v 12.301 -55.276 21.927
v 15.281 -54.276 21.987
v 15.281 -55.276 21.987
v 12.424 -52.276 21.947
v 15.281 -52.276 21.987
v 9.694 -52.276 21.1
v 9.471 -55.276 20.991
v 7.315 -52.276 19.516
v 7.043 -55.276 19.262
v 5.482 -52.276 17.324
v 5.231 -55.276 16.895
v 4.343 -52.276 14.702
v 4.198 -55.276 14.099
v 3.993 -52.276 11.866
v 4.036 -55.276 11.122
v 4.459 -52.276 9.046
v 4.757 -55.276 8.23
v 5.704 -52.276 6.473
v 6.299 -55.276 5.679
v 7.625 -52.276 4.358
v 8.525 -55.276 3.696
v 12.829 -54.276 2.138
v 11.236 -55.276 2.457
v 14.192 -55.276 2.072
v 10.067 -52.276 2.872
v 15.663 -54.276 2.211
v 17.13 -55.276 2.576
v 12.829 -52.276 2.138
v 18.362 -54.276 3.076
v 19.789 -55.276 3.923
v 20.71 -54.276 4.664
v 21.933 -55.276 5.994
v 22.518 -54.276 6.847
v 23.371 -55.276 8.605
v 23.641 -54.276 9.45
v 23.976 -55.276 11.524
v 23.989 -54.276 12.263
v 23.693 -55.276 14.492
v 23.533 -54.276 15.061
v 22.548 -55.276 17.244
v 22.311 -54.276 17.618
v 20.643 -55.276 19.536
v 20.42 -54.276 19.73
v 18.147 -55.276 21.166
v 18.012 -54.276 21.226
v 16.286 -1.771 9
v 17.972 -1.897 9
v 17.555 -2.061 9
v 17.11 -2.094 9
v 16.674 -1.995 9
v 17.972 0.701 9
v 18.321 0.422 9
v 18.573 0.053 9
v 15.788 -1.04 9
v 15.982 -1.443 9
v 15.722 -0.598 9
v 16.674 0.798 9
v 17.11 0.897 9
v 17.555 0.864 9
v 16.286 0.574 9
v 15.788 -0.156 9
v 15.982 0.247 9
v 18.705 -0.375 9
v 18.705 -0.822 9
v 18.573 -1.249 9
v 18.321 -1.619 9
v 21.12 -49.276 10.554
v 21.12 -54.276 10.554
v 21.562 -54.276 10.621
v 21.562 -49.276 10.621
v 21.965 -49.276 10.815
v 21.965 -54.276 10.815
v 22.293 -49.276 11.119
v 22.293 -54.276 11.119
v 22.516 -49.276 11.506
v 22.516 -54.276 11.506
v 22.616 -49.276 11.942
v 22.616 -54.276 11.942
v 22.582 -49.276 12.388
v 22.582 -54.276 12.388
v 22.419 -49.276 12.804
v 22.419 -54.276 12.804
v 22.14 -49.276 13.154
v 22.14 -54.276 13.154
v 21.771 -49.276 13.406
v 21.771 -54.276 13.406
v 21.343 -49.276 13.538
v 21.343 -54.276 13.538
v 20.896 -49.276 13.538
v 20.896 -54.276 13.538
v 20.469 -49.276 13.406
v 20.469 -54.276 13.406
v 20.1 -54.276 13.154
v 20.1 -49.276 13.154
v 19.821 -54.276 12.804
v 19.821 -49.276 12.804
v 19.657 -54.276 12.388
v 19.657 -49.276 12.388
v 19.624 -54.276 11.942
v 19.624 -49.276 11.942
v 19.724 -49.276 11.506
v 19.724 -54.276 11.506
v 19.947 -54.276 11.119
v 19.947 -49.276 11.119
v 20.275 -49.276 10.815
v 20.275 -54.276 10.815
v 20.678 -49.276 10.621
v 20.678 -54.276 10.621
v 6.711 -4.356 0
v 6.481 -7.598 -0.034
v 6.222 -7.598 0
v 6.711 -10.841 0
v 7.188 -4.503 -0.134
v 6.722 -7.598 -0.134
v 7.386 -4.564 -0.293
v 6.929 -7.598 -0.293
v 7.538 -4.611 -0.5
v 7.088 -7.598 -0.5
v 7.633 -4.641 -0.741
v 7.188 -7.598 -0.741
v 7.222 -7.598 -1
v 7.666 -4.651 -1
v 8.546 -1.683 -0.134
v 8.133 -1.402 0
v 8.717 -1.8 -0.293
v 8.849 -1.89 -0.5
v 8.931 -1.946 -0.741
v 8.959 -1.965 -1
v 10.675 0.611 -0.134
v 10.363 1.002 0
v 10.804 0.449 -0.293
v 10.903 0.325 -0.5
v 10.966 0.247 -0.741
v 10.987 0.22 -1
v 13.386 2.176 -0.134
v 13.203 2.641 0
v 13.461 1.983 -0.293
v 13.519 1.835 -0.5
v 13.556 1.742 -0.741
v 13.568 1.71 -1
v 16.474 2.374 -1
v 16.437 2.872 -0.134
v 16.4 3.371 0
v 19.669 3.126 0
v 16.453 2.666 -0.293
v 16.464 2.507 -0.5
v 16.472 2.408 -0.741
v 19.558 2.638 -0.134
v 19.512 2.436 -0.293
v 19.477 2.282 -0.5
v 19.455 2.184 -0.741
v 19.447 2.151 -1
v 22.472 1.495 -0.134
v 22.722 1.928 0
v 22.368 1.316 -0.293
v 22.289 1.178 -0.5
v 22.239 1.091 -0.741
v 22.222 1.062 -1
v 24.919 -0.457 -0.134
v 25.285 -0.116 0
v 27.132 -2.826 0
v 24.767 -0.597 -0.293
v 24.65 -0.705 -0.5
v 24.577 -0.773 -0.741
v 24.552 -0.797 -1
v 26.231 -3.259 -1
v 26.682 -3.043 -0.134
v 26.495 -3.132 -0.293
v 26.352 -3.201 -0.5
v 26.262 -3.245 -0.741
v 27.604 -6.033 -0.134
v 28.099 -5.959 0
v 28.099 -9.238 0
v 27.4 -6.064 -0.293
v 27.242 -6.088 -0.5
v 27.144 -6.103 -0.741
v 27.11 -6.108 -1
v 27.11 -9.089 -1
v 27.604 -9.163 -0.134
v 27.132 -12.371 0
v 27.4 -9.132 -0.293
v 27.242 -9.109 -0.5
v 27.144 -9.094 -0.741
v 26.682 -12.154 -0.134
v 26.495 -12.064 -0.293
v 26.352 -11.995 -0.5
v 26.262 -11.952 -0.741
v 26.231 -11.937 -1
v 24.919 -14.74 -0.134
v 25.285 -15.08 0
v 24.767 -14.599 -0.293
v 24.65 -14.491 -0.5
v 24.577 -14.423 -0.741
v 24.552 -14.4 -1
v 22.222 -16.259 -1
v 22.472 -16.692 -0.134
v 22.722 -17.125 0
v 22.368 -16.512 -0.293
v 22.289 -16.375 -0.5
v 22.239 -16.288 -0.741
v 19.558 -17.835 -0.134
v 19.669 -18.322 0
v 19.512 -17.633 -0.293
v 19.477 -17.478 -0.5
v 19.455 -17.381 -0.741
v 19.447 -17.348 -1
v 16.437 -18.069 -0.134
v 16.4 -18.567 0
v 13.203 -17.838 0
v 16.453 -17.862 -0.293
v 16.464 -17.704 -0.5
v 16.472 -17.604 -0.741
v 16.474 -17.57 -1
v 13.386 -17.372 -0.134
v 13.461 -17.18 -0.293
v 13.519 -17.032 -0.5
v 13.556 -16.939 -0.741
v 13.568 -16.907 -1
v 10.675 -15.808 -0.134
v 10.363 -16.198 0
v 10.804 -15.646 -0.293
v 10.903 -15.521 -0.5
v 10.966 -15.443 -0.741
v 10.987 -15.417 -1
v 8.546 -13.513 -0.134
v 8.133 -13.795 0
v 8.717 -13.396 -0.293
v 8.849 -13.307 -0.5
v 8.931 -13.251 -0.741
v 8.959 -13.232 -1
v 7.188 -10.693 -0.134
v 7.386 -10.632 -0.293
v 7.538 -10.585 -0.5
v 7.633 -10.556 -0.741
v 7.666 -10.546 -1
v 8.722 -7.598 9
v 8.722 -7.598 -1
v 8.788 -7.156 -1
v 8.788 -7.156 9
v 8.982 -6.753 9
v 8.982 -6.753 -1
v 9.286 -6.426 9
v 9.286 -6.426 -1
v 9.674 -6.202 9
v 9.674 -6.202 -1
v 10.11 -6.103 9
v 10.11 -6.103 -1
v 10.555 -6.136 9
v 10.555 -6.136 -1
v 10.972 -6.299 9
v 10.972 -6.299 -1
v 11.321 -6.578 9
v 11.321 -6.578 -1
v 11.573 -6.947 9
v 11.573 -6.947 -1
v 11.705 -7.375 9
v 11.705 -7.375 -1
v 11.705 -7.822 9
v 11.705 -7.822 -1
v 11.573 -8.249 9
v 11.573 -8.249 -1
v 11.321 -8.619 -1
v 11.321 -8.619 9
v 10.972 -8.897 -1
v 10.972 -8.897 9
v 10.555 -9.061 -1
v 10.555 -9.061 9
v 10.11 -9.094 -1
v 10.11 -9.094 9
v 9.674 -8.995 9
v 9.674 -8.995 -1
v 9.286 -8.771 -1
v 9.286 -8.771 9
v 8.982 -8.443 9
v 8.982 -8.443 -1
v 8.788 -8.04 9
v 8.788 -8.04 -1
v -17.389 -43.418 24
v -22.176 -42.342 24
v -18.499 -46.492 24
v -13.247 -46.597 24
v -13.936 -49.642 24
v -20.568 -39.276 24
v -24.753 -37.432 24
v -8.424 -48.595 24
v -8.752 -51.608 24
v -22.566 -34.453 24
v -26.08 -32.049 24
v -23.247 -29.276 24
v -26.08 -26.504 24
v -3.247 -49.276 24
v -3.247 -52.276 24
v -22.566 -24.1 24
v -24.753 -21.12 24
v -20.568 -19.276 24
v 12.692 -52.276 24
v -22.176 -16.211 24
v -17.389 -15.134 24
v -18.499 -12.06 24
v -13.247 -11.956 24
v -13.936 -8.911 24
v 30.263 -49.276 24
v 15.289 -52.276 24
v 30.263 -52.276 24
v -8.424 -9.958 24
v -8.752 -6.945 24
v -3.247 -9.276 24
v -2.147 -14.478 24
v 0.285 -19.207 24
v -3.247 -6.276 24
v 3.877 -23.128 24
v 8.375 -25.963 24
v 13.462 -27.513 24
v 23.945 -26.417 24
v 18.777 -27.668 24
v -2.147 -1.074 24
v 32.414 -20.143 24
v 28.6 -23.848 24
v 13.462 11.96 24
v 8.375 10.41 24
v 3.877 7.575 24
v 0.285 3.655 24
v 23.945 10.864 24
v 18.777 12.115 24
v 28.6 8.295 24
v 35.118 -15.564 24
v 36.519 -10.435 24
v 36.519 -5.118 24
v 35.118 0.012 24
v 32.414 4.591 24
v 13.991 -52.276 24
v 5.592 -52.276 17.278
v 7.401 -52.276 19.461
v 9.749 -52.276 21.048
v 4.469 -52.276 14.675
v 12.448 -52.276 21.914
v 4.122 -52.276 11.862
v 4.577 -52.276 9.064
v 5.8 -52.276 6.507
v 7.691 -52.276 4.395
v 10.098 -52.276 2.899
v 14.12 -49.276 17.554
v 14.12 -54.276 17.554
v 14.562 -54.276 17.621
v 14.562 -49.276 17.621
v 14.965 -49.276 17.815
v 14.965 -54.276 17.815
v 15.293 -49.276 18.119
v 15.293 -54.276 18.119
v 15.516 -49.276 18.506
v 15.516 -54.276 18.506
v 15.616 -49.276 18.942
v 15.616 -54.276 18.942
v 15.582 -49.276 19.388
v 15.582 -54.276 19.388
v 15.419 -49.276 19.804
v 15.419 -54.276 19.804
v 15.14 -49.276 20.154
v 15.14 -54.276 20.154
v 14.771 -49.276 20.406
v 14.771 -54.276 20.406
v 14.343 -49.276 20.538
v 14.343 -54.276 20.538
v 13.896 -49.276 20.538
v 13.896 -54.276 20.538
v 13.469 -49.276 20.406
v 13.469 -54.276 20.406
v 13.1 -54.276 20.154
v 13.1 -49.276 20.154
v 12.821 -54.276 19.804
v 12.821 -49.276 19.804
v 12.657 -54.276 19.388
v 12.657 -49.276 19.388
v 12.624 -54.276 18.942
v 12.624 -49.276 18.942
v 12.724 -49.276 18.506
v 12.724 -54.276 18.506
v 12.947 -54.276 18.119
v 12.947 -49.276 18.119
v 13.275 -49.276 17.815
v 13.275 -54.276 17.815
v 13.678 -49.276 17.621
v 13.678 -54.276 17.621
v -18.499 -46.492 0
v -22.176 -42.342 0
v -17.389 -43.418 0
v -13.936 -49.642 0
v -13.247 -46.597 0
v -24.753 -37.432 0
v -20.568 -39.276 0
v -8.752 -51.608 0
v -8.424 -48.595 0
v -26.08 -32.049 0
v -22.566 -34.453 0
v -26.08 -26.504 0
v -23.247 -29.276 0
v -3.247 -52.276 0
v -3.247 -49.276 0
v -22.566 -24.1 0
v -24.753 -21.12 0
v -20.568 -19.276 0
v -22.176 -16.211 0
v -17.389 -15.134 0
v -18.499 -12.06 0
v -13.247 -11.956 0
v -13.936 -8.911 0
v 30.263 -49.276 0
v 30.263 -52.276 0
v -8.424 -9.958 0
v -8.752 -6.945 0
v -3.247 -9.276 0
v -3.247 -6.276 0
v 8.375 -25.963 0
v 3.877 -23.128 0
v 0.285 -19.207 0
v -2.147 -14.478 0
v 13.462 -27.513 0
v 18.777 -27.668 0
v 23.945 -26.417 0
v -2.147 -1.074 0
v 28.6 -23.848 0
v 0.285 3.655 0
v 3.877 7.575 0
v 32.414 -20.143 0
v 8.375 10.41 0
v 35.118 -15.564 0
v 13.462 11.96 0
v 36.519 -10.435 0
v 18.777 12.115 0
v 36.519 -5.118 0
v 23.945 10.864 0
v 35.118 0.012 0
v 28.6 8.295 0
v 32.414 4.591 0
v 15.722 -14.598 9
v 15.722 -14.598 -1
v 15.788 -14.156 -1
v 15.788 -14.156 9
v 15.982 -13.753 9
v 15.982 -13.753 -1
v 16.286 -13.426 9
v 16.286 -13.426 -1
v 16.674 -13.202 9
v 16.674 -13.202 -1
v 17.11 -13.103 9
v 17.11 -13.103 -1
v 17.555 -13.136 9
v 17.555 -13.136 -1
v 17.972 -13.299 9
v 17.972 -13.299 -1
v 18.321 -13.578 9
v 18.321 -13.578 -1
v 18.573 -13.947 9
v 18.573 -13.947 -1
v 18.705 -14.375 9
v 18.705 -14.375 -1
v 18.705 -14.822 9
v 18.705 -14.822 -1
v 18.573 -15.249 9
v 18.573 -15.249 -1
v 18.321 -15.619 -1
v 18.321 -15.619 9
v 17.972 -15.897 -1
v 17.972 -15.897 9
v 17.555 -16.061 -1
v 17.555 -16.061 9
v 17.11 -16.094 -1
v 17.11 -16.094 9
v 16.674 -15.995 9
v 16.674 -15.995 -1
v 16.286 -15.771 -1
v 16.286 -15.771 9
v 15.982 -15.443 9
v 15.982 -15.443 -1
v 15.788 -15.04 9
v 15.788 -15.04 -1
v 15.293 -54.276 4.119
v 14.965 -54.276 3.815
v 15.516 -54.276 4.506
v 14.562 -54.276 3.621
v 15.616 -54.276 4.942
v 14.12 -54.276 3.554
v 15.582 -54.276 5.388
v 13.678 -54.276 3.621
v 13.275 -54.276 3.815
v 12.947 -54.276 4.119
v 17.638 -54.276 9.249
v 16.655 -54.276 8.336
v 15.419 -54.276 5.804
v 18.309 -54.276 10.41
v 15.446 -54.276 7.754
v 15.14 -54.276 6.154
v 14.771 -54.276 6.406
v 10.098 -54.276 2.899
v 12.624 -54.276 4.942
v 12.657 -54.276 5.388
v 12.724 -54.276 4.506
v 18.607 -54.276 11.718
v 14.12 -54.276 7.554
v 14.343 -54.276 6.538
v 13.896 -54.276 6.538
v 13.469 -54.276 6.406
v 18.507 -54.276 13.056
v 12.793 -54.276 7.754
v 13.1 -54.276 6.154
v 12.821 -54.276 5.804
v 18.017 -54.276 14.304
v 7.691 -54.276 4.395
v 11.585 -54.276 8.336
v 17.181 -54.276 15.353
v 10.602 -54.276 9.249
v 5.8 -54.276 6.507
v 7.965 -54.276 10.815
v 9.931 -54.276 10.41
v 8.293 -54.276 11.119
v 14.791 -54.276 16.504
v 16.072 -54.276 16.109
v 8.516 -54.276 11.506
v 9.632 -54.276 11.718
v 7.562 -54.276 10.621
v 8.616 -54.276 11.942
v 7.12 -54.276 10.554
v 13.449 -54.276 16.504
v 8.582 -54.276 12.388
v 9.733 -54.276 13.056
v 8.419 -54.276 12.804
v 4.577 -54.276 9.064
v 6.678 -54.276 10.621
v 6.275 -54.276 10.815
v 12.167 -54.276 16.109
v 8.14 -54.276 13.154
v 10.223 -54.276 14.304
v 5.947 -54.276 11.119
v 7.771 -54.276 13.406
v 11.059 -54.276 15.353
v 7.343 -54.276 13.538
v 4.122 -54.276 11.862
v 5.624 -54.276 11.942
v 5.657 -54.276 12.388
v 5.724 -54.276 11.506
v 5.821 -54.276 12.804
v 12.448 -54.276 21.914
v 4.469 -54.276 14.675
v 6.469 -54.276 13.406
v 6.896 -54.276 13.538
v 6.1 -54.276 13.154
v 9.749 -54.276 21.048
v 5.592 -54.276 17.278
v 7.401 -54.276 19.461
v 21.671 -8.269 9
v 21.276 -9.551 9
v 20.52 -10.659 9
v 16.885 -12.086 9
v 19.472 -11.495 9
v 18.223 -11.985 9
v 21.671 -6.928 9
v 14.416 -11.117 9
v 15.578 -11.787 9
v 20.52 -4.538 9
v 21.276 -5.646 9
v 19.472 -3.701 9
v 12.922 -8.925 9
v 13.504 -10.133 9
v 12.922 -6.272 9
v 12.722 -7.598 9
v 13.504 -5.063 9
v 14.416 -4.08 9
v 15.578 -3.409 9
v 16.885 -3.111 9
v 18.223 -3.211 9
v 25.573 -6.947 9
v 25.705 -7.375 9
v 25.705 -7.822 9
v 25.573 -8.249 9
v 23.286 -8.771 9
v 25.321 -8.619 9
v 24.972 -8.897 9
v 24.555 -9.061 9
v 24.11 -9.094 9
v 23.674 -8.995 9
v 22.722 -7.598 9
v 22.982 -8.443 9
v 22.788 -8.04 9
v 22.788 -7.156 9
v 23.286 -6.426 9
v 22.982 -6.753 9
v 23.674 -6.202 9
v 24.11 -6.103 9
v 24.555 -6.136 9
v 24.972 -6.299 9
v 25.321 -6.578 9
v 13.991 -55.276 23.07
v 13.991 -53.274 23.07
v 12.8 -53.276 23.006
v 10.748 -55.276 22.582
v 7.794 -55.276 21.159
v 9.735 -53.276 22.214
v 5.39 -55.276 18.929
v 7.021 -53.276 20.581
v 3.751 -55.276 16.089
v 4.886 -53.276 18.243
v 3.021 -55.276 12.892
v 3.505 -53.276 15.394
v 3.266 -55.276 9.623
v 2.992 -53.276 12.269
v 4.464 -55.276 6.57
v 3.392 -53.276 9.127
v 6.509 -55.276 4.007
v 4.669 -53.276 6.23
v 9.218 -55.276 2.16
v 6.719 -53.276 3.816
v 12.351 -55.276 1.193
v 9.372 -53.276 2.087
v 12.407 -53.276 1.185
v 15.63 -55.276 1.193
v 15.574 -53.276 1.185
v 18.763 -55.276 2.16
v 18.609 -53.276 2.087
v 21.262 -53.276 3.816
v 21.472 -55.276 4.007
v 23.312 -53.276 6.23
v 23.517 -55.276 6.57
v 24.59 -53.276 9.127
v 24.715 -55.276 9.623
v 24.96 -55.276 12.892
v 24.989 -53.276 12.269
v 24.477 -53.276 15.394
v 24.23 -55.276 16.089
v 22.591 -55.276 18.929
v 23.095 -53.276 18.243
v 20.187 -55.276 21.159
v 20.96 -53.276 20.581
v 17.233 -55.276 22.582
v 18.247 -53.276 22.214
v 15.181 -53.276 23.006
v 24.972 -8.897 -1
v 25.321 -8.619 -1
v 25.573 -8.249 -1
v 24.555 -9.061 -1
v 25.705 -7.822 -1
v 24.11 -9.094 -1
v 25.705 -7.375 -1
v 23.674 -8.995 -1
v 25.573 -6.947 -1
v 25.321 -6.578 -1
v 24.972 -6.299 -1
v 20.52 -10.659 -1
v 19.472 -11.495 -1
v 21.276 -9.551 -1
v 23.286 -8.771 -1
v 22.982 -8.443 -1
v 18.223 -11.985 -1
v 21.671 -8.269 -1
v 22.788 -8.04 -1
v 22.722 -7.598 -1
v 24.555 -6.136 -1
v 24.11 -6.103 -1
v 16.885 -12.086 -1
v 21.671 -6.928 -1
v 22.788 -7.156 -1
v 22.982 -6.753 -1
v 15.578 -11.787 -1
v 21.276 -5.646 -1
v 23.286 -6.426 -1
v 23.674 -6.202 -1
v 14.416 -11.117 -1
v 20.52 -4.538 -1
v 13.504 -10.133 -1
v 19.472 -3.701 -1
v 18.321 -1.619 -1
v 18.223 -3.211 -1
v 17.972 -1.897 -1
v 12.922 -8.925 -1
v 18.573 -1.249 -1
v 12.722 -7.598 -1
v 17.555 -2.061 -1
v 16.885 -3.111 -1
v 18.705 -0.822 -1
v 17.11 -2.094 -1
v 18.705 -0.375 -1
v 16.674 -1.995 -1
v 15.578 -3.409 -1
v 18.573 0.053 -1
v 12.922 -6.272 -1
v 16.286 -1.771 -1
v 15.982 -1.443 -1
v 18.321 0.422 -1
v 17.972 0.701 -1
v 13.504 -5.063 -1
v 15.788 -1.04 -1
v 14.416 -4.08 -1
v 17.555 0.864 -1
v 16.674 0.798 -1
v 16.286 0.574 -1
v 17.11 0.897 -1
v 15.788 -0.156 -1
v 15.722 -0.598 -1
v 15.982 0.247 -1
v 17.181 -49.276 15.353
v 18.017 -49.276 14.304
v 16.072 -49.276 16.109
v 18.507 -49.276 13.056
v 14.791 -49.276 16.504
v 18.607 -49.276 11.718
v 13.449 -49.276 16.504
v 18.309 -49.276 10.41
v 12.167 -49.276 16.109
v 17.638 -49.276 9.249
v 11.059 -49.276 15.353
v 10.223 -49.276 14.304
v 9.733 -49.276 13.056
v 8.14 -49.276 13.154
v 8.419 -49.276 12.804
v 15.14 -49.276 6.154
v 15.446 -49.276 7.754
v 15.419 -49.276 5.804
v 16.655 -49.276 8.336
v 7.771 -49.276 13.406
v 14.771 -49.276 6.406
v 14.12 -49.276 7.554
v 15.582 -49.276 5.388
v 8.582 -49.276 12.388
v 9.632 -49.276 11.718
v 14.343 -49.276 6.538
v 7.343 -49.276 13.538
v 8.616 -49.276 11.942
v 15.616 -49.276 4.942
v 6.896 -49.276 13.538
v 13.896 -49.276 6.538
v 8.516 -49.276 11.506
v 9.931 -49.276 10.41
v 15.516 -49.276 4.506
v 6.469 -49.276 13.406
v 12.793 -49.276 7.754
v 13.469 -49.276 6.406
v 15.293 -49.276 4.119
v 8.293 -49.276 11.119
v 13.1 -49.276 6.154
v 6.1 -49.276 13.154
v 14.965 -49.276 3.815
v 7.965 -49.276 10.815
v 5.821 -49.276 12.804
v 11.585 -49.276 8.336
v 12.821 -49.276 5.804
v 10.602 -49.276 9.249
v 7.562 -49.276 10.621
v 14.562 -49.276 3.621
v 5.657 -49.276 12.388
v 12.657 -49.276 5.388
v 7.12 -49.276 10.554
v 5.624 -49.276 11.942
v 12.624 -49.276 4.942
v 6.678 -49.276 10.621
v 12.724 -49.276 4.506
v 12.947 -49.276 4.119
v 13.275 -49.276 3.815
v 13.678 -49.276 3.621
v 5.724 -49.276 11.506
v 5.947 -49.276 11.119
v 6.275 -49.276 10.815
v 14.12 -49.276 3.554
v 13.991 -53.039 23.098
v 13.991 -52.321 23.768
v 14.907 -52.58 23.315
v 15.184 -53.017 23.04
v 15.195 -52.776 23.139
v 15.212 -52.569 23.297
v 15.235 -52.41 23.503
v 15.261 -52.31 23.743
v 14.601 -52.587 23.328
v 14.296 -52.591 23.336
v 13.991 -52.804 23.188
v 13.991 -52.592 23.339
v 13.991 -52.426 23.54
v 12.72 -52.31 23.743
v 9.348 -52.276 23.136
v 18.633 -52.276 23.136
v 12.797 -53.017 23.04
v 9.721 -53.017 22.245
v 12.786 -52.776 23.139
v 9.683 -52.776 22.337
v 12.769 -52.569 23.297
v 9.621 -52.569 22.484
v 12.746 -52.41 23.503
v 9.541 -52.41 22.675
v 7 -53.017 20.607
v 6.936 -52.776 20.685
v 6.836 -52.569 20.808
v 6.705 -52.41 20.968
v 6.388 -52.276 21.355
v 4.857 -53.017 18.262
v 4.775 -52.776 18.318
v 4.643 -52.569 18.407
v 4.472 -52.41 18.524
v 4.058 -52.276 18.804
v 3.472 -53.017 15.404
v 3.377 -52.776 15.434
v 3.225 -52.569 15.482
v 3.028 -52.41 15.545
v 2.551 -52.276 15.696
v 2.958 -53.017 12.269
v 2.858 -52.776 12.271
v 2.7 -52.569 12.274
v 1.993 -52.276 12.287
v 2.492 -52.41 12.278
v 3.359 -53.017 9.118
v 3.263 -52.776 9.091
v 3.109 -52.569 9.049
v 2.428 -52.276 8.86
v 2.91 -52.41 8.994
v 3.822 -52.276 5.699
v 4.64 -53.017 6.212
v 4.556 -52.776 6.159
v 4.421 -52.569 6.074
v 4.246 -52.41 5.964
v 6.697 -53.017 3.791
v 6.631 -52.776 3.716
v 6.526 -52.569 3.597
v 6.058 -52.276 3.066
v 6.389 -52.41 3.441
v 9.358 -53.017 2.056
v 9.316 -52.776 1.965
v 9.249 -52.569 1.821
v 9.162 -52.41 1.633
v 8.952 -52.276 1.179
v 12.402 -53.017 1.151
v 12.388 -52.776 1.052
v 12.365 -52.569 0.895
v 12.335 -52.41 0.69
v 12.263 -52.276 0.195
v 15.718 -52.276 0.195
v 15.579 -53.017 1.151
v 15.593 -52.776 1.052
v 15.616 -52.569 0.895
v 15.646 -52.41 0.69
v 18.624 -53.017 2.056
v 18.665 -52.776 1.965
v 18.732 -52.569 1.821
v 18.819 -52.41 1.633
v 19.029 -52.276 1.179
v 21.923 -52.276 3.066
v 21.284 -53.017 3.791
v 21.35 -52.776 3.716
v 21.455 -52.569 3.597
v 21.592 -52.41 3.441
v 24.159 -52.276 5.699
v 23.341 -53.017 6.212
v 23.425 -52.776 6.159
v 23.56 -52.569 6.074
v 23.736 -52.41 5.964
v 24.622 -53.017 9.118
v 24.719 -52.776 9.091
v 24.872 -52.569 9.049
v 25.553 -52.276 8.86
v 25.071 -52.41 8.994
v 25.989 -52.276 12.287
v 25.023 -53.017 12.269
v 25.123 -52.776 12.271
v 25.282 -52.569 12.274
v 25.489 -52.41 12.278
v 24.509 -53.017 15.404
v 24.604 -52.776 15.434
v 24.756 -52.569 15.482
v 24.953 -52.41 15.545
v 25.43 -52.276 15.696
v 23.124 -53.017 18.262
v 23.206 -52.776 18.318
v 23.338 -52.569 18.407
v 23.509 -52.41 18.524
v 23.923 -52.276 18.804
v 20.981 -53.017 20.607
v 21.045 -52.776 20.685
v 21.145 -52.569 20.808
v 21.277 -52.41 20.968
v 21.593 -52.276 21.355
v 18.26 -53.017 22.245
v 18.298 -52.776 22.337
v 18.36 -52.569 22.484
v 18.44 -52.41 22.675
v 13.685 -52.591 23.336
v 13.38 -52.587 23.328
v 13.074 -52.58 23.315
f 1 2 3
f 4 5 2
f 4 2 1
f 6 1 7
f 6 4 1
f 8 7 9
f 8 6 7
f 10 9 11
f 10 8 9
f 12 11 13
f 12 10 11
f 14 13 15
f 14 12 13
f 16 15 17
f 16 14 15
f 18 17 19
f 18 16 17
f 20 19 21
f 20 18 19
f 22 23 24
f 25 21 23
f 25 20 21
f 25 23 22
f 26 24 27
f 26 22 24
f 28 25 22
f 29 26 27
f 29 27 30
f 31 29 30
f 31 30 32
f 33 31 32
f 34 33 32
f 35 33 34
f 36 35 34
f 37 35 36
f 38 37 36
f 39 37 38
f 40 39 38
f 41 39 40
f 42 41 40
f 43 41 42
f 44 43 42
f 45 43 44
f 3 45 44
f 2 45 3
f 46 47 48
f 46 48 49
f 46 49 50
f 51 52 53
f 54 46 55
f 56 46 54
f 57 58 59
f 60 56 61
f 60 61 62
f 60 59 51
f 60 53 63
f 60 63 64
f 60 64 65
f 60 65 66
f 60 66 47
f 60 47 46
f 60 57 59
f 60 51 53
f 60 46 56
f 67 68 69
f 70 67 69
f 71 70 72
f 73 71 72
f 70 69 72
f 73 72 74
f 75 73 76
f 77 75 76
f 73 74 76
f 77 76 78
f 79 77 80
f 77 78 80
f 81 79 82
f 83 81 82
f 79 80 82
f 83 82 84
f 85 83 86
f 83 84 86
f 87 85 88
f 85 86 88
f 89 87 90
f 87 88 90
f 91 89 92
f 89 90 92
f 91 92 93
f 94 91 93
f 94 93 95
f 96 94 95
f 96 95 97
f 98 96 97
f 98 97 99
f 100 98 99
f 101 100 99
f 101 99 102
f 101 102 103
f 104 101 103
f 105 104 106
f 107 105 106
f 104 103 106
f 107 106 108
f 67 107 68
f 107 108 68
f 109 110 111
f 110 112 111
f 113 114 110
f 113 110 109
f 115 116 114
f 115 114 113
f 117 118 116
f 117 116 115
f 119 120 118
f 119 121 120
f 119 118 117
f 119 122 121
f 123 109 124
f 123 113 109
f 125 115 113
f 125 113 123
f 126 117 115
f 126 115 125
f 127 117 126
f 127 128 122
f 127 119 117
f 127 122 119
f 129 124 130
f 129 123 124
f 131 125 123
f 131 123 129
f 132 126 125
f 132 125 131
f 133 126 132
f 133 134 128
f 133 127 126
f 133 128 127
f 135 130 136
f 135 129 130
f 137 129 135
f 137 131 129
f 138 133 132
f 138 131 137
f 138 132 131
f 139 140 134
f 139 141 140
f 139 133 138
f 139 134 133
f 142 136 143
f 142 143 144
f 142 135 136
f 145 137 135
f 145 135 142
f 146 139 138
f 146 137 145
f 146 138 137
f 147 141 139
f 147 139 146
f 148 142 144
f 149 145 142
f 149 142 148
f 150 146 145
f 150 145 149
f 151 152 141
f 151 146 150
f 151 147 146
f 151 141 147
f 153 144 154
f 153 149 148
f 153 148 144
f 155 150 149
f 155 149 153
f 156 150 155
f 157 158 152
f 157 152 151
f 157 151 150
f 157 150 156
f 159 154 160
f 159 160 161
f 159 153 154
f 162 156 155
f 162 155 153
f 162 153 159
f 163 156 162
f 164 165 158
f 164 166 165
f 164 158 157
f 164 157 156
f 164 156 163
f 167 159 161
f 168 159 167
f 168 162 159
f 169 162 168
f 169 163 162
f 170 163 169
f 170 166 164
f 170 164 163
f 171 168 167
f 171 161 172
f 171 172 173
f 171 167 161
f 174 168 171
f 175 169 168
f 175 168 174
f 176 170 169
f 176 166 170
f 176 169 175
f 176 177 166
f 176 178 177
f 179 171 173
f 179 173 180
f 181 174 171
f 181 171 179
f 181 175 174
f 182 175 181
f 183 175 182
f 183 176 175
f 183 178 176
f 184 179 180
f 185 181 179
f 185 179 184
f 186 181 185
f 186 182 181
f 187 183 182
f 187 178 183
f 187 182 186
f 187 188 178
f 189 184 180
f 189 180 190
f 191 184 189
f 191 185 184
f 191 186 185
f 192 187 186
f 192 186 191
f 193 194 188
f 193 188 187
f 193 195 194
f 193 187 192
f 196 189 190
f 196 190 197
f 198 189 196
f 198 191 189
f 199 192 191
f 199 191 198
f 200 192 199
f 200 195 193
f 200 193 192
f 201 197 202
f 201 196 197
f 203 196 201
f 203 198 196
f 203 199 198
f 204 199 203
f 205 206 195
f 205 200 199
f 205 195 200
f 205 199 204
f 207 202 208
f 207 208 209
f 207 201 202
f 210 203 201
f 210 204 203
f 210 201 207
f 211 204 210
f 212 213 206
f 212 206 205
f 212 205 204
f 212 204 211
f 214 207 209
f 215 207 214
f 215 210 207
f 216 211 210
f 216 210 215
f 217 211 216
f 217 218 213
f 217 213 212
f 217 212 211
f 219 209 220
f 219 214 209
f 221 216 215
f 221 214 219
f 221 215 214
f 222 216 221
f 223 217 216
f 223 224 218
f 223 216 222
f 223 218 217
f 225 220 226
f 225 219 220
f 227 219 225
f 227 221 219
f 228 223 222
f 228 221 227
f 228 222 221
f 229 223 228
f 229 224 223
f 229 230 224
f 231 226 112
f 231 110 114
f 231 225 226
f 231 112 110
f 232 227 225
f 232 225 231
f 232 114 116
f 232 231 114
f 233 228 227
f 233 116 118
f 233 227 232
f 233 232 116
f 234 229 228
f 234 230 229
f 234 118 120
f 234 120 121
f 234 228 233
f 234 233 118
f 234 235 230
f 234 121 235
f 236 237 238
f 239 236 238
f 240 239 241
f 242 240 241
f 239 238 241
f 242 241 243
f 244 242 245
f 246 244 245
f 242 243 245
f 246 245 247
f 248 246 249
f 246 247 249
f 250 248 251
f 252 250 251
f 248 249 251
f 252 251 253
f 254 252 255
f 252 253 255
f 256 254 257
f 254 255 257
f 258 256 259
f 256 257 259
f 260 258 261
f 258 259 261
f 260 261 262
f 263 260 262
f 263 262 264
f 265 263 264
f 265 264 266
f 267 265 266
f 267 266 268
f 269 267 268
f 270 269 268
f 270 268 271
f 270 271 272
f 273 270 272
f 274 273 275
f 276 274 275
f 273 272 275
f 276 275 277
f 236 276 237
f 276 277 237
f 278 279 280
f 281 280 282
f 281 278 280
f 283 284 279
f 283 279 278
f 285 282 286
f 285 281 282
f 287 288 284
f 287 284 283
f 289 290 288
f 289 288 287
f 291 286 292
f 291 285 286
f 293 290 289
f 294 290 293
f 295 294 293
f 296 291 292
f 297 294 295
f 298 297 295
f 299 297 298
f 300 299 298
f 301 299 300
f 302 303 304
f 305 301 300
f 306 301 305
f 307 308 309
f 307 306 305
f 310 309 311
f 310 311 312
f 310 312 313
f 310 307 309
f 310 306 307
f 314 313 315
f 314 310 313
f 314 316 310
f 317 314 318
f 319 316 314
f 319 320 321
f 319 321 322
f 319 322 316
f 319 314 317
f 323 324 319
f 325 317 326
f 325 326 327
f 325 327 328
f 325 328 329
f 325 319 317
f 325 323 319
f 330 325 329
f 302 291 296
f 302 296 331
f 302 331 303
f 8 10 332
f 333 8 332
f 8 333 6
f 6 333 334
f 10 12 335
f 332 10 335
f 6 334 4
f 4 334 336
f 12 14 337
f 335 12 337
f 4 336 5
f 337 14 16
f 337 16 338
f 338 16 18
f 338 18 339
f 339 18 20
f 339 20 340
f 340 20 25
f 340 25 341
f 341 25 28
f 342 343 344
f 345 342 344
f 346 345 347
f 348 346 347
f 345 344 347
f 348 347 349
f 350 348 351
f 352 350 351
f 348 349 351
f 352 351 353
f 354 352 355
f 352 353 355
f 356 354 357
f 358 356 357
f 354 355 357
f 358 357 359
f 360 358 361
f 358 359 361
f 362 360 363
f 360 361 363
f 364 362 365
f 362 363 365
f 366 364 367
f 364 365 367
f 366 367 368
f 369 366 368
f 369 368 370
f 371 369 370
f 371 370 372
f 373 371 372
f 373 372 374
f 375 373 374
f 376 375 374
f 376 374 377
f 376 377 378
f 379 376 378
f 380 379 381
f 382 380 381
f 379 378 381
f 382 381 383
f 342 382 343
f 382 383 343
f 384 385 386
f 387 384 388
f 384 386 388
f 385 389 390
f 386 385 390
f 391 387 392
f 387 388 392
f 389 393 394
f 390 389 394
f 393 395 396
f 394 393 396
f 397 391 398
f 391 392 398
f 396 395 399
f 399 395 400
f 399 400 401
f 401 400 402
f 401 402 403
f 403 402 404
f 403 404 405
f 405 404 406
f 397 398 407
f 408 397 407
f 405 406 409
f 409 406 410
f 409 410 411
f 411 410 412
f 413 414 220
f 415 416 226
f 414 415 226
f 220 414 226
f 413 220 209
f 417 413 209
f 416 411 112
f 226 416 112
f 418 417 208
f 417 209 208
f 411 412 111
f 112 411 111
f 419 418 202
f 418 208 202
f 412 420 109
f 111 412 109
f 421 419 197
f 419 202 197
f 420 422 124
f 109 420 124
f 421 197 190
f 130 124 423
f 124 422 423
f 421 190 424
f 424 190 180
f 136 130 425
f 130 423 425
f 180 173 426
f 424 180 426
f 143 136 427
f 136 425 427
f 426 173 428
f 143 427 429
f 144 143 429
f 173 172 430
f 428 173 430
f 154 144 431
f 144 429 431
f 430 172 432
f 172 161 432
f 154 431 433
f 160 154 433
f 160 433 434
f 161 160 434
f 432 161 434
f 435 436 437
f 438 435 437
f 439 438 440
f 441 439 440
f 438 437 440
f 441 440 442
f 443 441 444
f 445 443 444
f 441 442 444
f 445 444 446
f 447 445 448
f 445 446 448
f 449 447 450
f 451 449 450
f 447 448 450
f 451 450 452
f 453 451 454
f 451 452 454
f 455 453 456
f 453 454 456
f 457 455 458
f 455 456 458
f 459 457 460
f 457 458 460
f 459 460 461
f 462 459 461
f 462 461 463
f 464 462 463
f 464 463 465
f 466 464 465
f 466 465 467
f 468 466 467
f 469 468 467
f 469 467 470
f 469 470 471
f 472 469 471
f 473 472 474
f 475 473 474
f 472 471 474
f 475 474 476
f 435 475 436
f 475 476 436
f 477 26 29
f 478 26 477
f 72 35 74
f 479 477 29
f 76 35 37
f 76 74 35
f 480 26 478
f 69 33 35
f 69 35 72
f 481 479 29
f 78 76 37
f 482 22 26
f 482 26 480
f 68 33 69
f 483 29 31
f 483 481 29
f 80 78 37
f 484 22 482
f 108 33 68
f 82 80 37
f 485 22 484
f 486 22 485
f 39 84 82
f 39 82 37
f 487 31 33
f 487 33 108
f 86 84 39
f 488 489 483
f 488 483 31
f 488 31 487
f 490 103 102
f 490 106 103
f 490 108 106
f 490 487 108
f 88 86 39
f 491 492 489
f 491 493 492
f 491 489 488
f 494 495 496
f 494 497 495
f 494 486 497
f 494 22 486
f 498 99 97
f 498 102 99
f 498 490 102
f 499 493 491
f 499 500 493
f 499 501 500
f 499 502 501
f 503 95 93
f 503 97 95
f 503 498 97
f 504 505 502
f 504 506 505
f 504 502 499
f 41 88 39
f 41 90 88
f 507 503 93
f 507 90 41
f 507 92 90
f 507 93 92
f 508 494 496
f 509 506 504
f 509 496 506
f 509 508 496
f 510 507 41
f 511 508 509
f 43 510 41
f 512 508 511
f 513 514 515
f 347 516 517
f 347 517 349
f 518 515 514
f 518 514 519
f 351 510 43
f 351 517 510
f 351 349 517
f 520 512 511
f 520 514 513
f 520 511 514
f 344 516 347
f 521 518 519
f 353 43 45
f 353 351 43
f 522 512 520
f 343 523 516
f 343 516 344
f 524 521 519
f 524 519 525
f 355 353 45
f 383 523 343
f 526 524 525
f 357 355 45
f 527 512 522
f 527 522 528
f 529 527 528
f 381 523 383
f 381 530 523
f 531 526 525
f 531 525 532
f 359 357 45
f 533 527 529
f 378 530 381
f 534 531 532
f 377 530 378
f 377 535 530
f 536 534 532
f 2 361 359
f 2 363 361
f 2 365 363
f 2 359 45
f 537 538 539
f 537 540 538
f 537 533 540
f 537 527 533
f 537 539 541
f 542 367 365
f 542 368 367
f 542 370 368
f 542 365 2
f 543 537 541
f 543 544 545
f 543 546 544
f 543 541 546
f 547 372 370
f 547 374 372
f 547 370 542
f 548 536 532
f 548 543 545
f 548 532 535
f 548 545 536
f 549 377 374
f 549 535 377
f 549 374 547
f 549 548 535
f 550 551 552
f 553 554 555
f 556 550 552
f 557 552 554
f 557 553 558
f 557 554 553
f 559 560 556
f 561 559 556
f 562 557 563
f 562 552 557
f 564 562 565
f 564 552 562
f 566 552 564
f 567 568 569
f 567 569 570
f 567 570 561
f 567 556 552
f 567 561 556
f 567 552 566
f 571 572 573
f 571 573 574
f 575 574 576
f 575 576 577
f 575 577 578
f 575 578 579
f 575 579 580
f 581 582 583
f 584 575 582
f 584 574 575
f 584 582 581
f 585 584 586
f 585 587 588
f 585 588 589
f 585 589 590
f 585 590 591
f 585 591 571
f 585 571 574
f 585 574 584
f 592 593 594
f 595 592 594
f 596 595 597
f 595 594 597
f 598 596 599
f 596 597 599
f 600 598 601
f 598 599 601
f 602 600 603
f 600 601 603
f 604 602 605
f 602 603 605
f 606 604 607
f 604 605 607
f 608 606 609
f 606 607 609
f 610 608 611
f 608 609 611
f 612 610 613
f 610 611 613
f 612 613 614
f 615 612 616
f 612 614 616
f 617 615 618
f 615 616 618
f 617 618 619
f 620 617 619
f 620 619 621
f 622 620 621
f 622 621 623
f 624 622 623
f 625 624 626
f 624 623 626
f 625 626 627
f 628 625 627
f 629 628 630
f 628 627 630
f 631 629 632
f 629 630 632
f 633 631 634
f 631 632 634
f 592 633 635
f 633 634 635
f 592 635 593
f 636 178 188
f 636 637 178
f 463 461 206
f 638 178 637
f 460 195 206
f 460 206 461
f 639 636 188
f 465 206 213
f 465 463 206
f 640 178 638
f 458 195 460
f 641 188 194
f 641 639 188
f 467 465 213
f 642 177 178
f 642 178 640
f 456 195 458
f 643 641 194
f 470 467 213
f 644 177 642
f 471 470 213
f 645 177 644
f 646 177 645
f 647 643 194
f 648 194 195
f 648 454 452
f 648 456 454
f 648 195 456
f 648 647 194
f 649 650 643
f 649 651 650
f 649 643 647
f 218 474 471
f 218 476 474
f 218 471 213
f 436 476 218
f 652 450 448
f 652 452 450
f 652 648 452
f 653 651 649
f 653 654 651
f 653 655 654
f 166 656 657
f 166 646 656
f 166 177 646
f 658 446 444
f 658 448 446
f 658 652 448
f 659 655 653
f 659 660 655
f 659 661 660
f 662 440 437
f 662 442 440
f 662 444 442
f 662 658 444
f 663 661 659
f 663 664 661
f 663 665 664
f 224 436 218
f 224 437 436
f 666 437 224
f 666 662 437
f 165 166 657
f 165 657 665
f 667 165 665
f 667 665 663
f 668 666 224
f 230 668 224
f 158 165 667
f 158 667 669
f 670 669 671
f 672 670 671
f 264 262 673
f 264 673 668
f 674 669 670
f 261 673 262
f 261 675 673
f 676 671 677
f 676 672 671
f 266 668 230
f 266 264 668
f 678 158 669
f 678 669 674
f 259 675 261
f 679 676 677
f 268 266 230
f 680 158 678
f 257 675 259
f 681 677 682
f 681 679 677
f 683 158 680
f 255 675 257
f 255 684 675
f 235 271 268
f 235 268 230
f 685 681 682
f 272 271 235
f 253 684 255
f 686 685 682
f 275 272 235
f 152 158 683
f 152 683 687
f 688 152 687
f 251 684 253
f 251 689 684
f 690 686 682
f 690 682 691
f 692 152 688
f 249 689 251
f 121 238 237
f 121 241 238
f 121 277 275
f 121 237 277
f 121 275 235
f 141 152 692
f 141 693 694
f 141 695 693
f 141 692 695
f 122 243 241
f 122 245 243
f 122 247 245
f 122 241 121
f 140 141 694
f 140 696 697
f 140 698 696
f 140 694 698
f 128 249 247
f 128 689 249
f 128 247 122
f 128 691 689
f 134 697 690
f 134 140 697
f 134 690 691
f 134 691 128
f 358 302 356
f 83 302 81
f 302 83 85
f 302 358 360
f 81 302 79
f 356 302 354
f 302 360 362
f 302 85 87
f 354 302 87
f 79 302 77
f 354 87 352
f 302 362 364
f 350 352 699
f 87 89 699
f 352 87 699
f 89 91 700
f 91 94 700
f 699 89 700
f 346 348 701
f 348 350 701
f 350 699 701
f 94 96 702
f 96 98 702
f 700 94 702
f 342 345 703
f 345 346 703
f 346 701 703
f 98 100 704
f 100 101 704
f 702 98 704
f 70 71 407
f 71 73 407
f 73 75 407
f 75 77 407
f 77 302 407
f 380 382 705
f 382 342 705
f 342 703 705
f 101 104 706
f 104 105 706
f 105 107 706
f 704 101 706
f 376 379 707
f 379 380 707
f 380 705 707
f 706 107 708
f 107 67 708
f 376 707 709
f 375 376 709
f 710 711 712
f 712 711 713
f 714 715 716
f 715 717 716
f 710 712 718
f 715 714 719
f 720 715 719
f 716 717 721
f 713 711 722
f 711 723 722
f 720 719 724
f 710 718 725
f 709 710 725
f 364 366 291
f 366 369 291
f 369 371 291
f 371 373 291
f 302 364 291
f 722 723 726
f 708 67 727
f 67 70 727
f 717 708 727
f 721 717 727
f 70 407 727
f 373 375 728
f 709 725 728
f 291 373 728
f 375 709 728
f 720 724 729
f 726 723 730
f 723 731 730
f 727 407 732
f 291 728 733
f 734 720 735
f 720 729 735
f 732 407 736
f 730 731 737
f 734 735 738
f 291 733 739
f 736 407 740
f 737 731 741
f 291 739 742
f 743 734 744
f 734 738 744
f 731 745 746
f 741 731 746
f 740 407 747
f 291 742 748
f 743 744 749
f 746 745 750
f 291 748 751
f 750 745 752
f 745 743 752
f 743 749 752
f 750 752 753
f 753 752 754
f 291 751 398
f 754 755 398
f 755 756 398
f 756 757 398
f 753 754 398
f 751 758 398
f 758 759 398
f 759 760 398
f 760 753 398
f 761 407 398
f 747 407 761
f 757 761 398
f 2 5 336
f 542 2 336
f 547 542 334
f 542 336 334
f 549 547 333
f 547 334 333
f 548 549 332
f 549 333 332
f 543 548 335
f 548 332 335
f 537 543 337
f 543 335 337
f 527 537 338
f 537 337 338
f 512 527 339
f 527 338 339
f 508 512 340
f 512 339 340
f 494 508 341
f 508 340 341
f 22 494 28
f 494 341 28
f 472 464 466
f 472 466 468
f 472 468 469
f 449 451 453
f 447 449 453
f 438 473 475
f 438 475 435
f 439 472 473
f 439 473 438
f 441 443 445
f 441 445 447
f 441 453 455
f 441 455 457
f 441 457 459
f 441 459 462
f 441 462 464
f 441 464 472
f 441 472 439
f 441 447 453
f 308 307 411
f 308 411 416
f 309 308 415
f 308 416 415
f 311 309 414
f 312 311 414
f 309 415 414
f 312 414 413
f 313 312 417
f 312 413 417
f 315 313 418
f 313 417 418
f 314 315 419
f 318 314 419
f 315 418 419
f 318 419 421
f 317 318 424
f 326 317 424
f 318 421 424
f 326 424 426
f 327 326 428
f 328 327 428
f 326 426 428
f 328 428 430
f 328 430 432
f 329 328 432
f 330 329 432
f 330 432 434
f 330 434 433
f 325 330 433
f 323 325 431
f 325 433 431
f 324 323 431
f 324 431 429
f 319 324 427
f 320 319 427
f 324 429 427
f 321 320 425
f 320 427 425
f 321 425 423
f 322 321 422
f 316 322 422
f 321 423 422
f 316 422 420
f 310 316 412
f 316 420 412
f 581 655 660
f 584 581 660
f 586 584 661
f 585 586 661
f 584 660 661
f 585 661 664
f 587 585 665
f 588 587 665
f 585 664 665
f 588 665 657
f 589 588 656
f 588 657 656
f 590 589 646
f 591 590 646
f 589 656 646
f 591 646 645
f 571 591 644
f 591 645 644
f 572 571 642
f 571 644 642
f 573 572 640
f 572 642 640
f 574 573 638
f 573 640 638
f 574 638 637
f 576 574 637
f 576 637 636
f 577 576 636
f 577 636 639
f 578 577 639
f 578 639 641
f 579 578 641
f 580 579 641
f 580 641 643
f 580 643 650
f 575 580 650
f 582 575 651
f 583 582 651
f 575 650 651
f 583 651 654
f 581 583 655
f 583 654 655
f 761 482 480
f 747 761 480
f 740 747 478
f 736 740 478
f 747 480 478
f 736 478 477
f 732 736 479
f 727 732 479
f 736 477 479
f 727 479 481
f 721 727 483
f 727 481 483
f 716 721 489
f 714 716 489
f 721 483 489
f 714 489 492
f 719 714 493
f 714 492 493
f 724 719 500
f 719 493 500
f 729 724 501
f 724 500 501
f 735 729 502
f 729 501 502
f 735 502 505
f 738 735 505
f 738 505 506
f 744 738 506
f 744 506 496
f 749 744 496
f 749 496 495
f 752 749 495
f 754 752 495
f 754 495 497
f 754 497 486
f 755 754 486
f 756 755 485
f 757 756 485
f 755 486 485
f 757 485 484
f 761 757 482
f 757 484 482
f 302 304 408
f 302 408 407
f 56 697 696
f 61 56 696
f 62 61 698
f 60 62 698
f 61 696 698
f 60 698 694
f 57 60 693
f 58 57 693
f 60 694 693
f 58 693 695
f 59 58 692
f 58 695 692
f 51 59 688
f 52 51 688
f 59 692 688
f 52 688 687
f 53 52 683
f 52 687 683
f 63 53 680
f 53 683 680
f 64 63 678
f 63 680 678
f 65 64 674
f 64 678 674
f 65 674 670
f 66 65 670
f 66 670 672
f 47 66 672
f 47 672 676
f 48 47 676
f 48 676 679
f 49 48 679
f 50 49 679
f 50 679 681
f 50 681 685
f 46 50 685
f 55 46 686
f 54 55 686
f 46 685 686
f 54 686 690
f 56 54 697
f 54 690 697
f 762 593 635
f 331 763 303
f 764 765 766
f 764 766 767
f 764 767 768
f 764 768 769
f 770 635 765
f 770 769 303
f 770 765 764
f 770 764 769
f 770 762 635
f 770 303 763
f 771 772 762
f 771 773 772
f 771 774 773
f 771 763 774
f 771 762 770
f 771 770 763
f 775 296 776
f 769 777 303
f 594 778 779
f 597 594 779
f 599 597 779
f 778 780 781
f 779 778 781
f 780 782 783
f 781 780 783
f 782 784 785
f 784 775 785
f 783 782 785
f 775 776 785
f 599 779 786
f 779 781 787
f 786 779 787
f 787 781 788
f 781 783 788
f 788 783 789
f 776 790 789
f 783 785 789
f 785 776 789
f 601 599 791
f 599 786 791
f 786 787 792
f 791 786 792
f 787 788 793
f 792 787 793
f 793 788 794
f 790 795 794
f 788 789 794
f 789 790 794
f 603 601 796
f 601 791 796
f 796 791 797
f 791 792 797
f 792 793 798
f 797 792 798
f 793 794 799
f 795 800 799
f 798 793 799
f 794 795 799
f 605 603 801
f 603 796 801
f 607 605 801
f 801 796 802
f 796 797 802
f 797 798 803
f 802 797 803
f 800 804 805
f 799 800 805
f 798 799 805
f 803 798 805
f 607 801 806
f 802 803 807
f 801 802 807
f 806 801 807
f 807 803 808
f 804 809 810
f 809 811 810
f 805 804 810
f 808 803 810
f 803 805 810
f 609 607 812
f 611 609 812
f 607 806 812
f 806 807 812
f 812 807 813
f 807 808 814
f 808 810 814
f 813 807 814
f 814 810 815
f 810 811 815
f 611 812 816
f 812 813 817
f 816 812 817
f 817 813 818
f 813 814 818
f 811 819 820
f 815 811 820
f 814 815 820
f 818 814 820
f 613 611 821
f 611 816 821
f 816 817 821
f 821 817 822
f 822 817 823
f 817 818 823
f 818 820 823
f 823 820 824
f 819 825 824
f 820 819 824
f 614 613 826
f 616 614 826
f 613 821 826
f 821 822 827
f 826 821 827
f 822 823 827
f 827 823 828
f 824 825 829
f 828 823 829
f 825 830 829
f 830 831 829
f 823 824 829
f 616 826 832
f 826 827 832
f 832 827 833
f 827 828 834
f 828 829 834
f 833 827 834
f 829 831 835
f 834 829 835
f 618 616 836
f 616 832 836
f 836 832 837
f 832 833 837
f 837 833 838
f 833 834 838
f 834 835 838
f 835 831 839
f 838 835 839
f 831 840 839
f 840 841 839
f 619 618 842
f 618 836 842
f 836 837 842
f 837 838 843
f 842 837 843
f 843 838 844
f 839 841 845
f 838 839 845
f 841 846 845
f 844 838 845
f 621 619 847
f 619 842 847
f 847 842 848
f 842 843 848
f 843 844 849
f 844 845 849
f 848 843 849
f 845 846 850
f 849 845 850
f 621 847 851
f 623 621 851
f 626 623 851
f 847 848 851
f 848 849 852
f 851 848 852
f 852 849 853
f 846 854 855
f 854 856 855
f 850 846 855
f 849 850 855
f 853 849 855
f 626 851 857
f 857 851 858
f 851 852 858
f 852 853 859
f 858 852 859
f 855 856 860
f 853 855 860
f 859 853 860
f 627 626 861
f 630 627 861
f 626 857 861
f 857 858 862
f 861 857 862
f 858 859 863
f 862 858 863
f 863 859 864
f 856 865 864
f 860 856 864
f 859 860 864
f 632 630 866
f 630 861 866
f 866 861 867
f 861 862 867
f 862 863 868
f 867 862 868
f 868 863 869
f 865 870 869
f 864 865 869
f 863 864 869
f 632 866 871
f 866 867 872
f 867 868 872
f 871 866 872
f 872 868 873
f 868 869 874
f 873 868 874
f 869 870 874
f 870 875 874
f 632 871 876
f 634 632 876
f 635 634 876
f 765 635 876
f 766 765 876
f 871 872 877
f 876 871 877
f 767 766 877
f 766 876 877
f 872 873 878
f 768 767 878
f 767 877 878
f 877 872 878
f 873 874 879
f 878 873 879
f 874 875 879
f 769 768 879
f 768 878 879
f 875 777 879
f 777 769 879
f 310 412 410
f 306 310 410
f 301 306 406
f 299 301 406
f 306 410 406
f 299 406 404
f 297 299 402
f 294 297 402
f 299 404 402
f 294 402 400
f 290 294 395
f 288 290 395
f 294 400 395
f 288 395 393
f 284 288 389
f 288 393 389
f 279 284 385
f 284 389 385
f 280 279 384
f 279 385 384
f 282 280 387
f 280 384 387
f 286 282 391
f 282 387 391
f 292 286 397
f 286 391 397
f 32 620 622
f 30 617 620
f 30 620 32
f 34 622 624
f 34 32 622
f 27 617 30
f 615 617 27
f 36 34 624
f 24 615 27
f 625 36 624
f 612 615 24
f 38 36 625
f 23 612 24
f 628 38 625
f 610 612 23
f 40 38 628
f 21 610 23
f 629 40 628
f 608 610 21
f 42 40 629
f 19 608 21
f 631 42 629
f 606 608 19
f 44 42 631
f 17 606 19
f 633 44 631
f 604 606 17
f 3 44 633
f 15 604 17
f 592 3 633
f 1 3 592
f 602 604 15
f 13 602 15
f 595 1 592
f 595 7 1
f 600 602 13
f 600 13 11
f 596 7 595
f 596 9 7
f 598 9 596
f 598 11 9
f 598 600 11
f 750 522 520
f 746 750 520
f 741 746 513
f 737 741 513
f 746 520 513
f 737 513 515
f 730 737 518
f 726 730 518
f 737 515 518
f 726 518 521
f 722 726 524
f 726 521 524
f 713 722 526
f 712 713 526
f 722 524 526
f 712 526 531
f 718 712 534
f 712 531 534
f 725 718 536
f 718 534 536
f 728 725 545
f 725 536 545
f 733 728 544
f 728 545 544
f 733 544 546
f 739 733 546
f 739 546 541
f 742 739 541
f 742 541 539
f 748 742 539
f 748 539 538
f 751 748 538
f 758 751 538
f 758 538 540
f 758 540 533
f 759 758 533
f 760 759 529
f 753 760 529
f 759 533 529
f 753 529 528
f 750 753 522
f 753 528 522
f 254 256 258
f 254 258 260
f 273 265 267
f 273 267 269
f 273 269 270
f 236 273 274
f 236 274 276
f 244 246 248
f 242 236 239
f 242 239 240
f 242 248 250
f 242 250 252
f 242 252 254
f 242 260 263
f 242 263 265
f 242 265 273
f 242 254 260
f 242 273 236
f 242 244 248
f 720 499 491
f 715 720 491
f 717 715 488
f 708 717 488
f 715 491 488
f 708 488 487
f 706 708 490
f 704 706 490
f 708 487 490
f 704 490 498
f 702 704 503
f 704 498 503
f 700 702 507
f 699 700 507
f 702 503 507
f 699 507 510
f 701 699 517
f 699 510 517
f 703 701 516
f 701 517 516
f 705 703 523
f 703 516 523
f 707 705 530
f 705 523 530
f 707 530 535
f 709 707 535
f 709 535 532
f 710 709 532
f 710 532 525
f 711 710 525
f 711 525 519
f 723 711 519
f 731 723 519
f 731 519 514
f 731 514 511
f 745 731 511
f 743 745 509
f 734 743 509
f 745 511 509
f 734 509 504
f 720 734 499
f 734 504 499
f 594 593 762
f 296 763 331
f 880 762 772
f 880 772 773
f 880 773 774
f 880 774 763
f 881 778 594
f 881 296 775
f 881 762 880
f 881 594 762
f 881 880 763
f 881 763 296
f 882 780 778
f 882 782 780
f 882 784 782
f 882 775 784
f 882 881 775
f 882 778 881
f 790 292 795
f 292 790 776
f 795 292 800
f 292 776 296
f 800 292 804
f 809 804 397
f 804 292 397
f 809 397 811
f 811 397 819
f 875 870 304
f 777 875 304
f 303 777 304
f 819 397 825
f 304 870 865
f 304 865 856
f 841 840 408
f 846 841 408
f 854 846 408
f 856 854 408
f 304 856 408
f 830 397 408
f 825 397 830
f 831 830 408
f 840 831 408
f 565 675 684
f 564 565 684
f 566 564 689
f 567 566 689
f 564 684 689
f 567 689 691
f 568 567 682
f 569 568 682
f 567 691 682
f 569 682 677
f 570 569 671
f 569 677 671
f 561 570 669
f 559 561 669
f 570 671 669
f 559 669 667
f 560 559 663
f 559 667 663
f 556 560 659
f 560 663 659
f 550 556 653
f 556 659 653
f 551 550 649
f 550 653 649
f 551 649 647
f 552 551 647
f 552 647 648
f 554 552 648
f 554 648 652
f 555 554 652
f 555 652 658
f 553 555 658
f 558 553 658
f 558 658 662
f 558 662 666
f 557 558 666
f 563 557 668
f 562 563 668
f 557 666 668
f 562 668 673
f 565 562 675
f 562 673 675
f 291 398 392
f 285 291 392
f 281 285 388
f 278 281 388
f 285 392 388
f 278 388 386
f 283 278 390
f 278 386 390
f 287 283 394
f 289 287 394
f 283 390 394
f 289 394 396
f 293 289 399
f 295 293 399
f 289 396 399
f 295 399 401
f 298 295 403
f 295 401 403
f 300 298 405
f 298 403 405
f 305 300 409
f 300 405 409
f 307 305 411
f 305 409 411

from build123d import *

# Parameters (mm, degrees)
BOSS_EXTRUDE1_DEPTH = 24
SKETCH2_R           = 10
BOSS_EXTRUDE2_DEPTH = 2
SKETCH3_R           = 1.5
SKETCH3_R_2         = 4.5
CUT_EXTRUDE1_DEPTH  = 5
SKETCH6_R           = 10
BOSS_EXTRUDE3_DEPTH = 1
FILLET2_R           = 1
SKETCH7_R           = 1.5
SKETCH7_R_2         = 4.5
CUT_EXTRUDE4_DEPTH  = 10
SKETCH9_R           = 11
SKETCH9_R_2         = 10
BOSS_EXTRUDE4_DEPTH = 3
FILLET3_R           = 1


with BuildPart() as part:
    # Sketch1 → Boss-Extrude1 (new body)
    with BuildSketch(Plane.XY):
        with BuildLine():
            Line((30.263122148, -52.276236142), (30.263122148, -49.276236142))
            Line((30.263122148, -49.276236142), (-3.247333847, -49.276236142))
            ThreePointArc((-3.247333847, -49.276236142), (-23.247333847, -29.276236142), (-3.247333847, -9.276236142))
            ThreePointArc((-3.247333847, -9.276236142), (36.696336828, -7.776236142), (-3.247333847, -6.276236142))
            ThreePointArc((-3.247333847, -6.276236142), (-26.247333847, -29.276236142), (-3.247333847, -52.276236142))
            Line((-3.247333847, -52.276236142), (30.263122148, -52.276236142))
        make_face()
    extrude(amount=BOSS_EXTRUDE1_DEPTH)

    # Sketch2 → Boss-Extrude2 (add)
    with BuildSketch(Plane.XZ.offset(52.276236142)):
        with Locations(Location((14.119877924, 12.054461488, 0), (0, 0, 90))):
            Circle(SKETCH2_R)
    extrude(amount=BOSS_EXTRUDE2_DEPTH)

    # Sketch3 → Cut-Extrude1 (cut)
    with BuildSketch(Plane.XZ.offset(54.276236142)):
        with Locations(Location((14.119877924, 19.054461488, 0), (0, 0, 270))):
            Circle(SKETCH3_R)
        with Locations(Location((21.119877924, 12.054461488, 0), (0, 0, 270))):
            Circle(SKETCH3_R)
        with Locations(Location((14.119877924, 5.054461488, 0), (0, 0, 270))):
            Circle(SKETCH3_R)
        with Locations(Location((7.119877924, 12.054461488, 0), (0, 0, 270))):
            Circle(SKETCH3_R)
        with Locations(Location((14.119877924, 12.054461488, 0), (0, 0, 270))):
            Circle(SKETCH3_R_2)
    extrude(amount=-CUT_EXTRUDE1_DEPTH, mode=Mode.SUBTRACT)

    # Sketch6 → Boss-Extrude3 (add)
    with BuildSketch(Plane(origin=(0, 0, 0), x_dir=(-1, 0, 0), z_dir=(0, 0, -1))):
        with Locations((-17.221710812, -7.598312744)):
            Circle(SKETCH6_R)
    extrude(amount=BOSS_EXTRUDE3_DEPTH)

    # Fillet2
    fillet2_edges = [part.edges().sort_by_distance(p)[0] for p in [
        (27.221710812, -7.598312744, 0),
    ]]
    fillet(fillet2_edges, radius=FILLET2_R - 0.0001)  # a hair under: the kernel refuses the full size

    # Sketch7 → Cut-Extrude4 (cut)
    with BuildSketch(Plane(origin=(0, 0, -1), x_dir=(-1, 0, 0), z_dir=(0, 0, -1))):
        with Locations((-17.221710812, -0.598312744)):
            Circle(SKETCH7_R)
        with Locations((-10.221710812, -7.598312744)):
            Circle(SKETCH7_R)
        with Locations((-17.221710812, -14.598312744)):
            Circle(SKETCH7_R)
        with Locations((-24.221710812, -7.598312744)):
            Circle(SKETCH7_R)
        with Locations((-17.221710812, -7.598312744)):
            Circle(SKETCH7_R_2)
    extrude(amount=-CUT_EXTRUDE4_DEPTH, mode=Mode.SUBTRACT)

    # Sketch9 → Boss-Extrude4 (add)
    with BuildSketch(Plane.XZ.offset(52.276236142)):
        with Locations(Location((13.990564712, 12.070439632, 0), (0, 0, 90))):
            Circle(SKETCH9_R)
        with Locations(Location((13.990564712, 12.070439632, 0), (0, 0, 82.582870782))):
            Circle(SKETCH9_R_2, mode=Mode.SUBTRACT)
    extrude(amount=BOSS_EXTRUDE4_DEPTH)

    # Fillet3
    fillet3_edges = [part.edges().sort_by_distance(p)[0] for p in [
        (13.990564712, -52.276236142, 1.070439632),
    ]]
    fillet(fillet3_edges, radius=FILLET3_R)


solid = part.part
